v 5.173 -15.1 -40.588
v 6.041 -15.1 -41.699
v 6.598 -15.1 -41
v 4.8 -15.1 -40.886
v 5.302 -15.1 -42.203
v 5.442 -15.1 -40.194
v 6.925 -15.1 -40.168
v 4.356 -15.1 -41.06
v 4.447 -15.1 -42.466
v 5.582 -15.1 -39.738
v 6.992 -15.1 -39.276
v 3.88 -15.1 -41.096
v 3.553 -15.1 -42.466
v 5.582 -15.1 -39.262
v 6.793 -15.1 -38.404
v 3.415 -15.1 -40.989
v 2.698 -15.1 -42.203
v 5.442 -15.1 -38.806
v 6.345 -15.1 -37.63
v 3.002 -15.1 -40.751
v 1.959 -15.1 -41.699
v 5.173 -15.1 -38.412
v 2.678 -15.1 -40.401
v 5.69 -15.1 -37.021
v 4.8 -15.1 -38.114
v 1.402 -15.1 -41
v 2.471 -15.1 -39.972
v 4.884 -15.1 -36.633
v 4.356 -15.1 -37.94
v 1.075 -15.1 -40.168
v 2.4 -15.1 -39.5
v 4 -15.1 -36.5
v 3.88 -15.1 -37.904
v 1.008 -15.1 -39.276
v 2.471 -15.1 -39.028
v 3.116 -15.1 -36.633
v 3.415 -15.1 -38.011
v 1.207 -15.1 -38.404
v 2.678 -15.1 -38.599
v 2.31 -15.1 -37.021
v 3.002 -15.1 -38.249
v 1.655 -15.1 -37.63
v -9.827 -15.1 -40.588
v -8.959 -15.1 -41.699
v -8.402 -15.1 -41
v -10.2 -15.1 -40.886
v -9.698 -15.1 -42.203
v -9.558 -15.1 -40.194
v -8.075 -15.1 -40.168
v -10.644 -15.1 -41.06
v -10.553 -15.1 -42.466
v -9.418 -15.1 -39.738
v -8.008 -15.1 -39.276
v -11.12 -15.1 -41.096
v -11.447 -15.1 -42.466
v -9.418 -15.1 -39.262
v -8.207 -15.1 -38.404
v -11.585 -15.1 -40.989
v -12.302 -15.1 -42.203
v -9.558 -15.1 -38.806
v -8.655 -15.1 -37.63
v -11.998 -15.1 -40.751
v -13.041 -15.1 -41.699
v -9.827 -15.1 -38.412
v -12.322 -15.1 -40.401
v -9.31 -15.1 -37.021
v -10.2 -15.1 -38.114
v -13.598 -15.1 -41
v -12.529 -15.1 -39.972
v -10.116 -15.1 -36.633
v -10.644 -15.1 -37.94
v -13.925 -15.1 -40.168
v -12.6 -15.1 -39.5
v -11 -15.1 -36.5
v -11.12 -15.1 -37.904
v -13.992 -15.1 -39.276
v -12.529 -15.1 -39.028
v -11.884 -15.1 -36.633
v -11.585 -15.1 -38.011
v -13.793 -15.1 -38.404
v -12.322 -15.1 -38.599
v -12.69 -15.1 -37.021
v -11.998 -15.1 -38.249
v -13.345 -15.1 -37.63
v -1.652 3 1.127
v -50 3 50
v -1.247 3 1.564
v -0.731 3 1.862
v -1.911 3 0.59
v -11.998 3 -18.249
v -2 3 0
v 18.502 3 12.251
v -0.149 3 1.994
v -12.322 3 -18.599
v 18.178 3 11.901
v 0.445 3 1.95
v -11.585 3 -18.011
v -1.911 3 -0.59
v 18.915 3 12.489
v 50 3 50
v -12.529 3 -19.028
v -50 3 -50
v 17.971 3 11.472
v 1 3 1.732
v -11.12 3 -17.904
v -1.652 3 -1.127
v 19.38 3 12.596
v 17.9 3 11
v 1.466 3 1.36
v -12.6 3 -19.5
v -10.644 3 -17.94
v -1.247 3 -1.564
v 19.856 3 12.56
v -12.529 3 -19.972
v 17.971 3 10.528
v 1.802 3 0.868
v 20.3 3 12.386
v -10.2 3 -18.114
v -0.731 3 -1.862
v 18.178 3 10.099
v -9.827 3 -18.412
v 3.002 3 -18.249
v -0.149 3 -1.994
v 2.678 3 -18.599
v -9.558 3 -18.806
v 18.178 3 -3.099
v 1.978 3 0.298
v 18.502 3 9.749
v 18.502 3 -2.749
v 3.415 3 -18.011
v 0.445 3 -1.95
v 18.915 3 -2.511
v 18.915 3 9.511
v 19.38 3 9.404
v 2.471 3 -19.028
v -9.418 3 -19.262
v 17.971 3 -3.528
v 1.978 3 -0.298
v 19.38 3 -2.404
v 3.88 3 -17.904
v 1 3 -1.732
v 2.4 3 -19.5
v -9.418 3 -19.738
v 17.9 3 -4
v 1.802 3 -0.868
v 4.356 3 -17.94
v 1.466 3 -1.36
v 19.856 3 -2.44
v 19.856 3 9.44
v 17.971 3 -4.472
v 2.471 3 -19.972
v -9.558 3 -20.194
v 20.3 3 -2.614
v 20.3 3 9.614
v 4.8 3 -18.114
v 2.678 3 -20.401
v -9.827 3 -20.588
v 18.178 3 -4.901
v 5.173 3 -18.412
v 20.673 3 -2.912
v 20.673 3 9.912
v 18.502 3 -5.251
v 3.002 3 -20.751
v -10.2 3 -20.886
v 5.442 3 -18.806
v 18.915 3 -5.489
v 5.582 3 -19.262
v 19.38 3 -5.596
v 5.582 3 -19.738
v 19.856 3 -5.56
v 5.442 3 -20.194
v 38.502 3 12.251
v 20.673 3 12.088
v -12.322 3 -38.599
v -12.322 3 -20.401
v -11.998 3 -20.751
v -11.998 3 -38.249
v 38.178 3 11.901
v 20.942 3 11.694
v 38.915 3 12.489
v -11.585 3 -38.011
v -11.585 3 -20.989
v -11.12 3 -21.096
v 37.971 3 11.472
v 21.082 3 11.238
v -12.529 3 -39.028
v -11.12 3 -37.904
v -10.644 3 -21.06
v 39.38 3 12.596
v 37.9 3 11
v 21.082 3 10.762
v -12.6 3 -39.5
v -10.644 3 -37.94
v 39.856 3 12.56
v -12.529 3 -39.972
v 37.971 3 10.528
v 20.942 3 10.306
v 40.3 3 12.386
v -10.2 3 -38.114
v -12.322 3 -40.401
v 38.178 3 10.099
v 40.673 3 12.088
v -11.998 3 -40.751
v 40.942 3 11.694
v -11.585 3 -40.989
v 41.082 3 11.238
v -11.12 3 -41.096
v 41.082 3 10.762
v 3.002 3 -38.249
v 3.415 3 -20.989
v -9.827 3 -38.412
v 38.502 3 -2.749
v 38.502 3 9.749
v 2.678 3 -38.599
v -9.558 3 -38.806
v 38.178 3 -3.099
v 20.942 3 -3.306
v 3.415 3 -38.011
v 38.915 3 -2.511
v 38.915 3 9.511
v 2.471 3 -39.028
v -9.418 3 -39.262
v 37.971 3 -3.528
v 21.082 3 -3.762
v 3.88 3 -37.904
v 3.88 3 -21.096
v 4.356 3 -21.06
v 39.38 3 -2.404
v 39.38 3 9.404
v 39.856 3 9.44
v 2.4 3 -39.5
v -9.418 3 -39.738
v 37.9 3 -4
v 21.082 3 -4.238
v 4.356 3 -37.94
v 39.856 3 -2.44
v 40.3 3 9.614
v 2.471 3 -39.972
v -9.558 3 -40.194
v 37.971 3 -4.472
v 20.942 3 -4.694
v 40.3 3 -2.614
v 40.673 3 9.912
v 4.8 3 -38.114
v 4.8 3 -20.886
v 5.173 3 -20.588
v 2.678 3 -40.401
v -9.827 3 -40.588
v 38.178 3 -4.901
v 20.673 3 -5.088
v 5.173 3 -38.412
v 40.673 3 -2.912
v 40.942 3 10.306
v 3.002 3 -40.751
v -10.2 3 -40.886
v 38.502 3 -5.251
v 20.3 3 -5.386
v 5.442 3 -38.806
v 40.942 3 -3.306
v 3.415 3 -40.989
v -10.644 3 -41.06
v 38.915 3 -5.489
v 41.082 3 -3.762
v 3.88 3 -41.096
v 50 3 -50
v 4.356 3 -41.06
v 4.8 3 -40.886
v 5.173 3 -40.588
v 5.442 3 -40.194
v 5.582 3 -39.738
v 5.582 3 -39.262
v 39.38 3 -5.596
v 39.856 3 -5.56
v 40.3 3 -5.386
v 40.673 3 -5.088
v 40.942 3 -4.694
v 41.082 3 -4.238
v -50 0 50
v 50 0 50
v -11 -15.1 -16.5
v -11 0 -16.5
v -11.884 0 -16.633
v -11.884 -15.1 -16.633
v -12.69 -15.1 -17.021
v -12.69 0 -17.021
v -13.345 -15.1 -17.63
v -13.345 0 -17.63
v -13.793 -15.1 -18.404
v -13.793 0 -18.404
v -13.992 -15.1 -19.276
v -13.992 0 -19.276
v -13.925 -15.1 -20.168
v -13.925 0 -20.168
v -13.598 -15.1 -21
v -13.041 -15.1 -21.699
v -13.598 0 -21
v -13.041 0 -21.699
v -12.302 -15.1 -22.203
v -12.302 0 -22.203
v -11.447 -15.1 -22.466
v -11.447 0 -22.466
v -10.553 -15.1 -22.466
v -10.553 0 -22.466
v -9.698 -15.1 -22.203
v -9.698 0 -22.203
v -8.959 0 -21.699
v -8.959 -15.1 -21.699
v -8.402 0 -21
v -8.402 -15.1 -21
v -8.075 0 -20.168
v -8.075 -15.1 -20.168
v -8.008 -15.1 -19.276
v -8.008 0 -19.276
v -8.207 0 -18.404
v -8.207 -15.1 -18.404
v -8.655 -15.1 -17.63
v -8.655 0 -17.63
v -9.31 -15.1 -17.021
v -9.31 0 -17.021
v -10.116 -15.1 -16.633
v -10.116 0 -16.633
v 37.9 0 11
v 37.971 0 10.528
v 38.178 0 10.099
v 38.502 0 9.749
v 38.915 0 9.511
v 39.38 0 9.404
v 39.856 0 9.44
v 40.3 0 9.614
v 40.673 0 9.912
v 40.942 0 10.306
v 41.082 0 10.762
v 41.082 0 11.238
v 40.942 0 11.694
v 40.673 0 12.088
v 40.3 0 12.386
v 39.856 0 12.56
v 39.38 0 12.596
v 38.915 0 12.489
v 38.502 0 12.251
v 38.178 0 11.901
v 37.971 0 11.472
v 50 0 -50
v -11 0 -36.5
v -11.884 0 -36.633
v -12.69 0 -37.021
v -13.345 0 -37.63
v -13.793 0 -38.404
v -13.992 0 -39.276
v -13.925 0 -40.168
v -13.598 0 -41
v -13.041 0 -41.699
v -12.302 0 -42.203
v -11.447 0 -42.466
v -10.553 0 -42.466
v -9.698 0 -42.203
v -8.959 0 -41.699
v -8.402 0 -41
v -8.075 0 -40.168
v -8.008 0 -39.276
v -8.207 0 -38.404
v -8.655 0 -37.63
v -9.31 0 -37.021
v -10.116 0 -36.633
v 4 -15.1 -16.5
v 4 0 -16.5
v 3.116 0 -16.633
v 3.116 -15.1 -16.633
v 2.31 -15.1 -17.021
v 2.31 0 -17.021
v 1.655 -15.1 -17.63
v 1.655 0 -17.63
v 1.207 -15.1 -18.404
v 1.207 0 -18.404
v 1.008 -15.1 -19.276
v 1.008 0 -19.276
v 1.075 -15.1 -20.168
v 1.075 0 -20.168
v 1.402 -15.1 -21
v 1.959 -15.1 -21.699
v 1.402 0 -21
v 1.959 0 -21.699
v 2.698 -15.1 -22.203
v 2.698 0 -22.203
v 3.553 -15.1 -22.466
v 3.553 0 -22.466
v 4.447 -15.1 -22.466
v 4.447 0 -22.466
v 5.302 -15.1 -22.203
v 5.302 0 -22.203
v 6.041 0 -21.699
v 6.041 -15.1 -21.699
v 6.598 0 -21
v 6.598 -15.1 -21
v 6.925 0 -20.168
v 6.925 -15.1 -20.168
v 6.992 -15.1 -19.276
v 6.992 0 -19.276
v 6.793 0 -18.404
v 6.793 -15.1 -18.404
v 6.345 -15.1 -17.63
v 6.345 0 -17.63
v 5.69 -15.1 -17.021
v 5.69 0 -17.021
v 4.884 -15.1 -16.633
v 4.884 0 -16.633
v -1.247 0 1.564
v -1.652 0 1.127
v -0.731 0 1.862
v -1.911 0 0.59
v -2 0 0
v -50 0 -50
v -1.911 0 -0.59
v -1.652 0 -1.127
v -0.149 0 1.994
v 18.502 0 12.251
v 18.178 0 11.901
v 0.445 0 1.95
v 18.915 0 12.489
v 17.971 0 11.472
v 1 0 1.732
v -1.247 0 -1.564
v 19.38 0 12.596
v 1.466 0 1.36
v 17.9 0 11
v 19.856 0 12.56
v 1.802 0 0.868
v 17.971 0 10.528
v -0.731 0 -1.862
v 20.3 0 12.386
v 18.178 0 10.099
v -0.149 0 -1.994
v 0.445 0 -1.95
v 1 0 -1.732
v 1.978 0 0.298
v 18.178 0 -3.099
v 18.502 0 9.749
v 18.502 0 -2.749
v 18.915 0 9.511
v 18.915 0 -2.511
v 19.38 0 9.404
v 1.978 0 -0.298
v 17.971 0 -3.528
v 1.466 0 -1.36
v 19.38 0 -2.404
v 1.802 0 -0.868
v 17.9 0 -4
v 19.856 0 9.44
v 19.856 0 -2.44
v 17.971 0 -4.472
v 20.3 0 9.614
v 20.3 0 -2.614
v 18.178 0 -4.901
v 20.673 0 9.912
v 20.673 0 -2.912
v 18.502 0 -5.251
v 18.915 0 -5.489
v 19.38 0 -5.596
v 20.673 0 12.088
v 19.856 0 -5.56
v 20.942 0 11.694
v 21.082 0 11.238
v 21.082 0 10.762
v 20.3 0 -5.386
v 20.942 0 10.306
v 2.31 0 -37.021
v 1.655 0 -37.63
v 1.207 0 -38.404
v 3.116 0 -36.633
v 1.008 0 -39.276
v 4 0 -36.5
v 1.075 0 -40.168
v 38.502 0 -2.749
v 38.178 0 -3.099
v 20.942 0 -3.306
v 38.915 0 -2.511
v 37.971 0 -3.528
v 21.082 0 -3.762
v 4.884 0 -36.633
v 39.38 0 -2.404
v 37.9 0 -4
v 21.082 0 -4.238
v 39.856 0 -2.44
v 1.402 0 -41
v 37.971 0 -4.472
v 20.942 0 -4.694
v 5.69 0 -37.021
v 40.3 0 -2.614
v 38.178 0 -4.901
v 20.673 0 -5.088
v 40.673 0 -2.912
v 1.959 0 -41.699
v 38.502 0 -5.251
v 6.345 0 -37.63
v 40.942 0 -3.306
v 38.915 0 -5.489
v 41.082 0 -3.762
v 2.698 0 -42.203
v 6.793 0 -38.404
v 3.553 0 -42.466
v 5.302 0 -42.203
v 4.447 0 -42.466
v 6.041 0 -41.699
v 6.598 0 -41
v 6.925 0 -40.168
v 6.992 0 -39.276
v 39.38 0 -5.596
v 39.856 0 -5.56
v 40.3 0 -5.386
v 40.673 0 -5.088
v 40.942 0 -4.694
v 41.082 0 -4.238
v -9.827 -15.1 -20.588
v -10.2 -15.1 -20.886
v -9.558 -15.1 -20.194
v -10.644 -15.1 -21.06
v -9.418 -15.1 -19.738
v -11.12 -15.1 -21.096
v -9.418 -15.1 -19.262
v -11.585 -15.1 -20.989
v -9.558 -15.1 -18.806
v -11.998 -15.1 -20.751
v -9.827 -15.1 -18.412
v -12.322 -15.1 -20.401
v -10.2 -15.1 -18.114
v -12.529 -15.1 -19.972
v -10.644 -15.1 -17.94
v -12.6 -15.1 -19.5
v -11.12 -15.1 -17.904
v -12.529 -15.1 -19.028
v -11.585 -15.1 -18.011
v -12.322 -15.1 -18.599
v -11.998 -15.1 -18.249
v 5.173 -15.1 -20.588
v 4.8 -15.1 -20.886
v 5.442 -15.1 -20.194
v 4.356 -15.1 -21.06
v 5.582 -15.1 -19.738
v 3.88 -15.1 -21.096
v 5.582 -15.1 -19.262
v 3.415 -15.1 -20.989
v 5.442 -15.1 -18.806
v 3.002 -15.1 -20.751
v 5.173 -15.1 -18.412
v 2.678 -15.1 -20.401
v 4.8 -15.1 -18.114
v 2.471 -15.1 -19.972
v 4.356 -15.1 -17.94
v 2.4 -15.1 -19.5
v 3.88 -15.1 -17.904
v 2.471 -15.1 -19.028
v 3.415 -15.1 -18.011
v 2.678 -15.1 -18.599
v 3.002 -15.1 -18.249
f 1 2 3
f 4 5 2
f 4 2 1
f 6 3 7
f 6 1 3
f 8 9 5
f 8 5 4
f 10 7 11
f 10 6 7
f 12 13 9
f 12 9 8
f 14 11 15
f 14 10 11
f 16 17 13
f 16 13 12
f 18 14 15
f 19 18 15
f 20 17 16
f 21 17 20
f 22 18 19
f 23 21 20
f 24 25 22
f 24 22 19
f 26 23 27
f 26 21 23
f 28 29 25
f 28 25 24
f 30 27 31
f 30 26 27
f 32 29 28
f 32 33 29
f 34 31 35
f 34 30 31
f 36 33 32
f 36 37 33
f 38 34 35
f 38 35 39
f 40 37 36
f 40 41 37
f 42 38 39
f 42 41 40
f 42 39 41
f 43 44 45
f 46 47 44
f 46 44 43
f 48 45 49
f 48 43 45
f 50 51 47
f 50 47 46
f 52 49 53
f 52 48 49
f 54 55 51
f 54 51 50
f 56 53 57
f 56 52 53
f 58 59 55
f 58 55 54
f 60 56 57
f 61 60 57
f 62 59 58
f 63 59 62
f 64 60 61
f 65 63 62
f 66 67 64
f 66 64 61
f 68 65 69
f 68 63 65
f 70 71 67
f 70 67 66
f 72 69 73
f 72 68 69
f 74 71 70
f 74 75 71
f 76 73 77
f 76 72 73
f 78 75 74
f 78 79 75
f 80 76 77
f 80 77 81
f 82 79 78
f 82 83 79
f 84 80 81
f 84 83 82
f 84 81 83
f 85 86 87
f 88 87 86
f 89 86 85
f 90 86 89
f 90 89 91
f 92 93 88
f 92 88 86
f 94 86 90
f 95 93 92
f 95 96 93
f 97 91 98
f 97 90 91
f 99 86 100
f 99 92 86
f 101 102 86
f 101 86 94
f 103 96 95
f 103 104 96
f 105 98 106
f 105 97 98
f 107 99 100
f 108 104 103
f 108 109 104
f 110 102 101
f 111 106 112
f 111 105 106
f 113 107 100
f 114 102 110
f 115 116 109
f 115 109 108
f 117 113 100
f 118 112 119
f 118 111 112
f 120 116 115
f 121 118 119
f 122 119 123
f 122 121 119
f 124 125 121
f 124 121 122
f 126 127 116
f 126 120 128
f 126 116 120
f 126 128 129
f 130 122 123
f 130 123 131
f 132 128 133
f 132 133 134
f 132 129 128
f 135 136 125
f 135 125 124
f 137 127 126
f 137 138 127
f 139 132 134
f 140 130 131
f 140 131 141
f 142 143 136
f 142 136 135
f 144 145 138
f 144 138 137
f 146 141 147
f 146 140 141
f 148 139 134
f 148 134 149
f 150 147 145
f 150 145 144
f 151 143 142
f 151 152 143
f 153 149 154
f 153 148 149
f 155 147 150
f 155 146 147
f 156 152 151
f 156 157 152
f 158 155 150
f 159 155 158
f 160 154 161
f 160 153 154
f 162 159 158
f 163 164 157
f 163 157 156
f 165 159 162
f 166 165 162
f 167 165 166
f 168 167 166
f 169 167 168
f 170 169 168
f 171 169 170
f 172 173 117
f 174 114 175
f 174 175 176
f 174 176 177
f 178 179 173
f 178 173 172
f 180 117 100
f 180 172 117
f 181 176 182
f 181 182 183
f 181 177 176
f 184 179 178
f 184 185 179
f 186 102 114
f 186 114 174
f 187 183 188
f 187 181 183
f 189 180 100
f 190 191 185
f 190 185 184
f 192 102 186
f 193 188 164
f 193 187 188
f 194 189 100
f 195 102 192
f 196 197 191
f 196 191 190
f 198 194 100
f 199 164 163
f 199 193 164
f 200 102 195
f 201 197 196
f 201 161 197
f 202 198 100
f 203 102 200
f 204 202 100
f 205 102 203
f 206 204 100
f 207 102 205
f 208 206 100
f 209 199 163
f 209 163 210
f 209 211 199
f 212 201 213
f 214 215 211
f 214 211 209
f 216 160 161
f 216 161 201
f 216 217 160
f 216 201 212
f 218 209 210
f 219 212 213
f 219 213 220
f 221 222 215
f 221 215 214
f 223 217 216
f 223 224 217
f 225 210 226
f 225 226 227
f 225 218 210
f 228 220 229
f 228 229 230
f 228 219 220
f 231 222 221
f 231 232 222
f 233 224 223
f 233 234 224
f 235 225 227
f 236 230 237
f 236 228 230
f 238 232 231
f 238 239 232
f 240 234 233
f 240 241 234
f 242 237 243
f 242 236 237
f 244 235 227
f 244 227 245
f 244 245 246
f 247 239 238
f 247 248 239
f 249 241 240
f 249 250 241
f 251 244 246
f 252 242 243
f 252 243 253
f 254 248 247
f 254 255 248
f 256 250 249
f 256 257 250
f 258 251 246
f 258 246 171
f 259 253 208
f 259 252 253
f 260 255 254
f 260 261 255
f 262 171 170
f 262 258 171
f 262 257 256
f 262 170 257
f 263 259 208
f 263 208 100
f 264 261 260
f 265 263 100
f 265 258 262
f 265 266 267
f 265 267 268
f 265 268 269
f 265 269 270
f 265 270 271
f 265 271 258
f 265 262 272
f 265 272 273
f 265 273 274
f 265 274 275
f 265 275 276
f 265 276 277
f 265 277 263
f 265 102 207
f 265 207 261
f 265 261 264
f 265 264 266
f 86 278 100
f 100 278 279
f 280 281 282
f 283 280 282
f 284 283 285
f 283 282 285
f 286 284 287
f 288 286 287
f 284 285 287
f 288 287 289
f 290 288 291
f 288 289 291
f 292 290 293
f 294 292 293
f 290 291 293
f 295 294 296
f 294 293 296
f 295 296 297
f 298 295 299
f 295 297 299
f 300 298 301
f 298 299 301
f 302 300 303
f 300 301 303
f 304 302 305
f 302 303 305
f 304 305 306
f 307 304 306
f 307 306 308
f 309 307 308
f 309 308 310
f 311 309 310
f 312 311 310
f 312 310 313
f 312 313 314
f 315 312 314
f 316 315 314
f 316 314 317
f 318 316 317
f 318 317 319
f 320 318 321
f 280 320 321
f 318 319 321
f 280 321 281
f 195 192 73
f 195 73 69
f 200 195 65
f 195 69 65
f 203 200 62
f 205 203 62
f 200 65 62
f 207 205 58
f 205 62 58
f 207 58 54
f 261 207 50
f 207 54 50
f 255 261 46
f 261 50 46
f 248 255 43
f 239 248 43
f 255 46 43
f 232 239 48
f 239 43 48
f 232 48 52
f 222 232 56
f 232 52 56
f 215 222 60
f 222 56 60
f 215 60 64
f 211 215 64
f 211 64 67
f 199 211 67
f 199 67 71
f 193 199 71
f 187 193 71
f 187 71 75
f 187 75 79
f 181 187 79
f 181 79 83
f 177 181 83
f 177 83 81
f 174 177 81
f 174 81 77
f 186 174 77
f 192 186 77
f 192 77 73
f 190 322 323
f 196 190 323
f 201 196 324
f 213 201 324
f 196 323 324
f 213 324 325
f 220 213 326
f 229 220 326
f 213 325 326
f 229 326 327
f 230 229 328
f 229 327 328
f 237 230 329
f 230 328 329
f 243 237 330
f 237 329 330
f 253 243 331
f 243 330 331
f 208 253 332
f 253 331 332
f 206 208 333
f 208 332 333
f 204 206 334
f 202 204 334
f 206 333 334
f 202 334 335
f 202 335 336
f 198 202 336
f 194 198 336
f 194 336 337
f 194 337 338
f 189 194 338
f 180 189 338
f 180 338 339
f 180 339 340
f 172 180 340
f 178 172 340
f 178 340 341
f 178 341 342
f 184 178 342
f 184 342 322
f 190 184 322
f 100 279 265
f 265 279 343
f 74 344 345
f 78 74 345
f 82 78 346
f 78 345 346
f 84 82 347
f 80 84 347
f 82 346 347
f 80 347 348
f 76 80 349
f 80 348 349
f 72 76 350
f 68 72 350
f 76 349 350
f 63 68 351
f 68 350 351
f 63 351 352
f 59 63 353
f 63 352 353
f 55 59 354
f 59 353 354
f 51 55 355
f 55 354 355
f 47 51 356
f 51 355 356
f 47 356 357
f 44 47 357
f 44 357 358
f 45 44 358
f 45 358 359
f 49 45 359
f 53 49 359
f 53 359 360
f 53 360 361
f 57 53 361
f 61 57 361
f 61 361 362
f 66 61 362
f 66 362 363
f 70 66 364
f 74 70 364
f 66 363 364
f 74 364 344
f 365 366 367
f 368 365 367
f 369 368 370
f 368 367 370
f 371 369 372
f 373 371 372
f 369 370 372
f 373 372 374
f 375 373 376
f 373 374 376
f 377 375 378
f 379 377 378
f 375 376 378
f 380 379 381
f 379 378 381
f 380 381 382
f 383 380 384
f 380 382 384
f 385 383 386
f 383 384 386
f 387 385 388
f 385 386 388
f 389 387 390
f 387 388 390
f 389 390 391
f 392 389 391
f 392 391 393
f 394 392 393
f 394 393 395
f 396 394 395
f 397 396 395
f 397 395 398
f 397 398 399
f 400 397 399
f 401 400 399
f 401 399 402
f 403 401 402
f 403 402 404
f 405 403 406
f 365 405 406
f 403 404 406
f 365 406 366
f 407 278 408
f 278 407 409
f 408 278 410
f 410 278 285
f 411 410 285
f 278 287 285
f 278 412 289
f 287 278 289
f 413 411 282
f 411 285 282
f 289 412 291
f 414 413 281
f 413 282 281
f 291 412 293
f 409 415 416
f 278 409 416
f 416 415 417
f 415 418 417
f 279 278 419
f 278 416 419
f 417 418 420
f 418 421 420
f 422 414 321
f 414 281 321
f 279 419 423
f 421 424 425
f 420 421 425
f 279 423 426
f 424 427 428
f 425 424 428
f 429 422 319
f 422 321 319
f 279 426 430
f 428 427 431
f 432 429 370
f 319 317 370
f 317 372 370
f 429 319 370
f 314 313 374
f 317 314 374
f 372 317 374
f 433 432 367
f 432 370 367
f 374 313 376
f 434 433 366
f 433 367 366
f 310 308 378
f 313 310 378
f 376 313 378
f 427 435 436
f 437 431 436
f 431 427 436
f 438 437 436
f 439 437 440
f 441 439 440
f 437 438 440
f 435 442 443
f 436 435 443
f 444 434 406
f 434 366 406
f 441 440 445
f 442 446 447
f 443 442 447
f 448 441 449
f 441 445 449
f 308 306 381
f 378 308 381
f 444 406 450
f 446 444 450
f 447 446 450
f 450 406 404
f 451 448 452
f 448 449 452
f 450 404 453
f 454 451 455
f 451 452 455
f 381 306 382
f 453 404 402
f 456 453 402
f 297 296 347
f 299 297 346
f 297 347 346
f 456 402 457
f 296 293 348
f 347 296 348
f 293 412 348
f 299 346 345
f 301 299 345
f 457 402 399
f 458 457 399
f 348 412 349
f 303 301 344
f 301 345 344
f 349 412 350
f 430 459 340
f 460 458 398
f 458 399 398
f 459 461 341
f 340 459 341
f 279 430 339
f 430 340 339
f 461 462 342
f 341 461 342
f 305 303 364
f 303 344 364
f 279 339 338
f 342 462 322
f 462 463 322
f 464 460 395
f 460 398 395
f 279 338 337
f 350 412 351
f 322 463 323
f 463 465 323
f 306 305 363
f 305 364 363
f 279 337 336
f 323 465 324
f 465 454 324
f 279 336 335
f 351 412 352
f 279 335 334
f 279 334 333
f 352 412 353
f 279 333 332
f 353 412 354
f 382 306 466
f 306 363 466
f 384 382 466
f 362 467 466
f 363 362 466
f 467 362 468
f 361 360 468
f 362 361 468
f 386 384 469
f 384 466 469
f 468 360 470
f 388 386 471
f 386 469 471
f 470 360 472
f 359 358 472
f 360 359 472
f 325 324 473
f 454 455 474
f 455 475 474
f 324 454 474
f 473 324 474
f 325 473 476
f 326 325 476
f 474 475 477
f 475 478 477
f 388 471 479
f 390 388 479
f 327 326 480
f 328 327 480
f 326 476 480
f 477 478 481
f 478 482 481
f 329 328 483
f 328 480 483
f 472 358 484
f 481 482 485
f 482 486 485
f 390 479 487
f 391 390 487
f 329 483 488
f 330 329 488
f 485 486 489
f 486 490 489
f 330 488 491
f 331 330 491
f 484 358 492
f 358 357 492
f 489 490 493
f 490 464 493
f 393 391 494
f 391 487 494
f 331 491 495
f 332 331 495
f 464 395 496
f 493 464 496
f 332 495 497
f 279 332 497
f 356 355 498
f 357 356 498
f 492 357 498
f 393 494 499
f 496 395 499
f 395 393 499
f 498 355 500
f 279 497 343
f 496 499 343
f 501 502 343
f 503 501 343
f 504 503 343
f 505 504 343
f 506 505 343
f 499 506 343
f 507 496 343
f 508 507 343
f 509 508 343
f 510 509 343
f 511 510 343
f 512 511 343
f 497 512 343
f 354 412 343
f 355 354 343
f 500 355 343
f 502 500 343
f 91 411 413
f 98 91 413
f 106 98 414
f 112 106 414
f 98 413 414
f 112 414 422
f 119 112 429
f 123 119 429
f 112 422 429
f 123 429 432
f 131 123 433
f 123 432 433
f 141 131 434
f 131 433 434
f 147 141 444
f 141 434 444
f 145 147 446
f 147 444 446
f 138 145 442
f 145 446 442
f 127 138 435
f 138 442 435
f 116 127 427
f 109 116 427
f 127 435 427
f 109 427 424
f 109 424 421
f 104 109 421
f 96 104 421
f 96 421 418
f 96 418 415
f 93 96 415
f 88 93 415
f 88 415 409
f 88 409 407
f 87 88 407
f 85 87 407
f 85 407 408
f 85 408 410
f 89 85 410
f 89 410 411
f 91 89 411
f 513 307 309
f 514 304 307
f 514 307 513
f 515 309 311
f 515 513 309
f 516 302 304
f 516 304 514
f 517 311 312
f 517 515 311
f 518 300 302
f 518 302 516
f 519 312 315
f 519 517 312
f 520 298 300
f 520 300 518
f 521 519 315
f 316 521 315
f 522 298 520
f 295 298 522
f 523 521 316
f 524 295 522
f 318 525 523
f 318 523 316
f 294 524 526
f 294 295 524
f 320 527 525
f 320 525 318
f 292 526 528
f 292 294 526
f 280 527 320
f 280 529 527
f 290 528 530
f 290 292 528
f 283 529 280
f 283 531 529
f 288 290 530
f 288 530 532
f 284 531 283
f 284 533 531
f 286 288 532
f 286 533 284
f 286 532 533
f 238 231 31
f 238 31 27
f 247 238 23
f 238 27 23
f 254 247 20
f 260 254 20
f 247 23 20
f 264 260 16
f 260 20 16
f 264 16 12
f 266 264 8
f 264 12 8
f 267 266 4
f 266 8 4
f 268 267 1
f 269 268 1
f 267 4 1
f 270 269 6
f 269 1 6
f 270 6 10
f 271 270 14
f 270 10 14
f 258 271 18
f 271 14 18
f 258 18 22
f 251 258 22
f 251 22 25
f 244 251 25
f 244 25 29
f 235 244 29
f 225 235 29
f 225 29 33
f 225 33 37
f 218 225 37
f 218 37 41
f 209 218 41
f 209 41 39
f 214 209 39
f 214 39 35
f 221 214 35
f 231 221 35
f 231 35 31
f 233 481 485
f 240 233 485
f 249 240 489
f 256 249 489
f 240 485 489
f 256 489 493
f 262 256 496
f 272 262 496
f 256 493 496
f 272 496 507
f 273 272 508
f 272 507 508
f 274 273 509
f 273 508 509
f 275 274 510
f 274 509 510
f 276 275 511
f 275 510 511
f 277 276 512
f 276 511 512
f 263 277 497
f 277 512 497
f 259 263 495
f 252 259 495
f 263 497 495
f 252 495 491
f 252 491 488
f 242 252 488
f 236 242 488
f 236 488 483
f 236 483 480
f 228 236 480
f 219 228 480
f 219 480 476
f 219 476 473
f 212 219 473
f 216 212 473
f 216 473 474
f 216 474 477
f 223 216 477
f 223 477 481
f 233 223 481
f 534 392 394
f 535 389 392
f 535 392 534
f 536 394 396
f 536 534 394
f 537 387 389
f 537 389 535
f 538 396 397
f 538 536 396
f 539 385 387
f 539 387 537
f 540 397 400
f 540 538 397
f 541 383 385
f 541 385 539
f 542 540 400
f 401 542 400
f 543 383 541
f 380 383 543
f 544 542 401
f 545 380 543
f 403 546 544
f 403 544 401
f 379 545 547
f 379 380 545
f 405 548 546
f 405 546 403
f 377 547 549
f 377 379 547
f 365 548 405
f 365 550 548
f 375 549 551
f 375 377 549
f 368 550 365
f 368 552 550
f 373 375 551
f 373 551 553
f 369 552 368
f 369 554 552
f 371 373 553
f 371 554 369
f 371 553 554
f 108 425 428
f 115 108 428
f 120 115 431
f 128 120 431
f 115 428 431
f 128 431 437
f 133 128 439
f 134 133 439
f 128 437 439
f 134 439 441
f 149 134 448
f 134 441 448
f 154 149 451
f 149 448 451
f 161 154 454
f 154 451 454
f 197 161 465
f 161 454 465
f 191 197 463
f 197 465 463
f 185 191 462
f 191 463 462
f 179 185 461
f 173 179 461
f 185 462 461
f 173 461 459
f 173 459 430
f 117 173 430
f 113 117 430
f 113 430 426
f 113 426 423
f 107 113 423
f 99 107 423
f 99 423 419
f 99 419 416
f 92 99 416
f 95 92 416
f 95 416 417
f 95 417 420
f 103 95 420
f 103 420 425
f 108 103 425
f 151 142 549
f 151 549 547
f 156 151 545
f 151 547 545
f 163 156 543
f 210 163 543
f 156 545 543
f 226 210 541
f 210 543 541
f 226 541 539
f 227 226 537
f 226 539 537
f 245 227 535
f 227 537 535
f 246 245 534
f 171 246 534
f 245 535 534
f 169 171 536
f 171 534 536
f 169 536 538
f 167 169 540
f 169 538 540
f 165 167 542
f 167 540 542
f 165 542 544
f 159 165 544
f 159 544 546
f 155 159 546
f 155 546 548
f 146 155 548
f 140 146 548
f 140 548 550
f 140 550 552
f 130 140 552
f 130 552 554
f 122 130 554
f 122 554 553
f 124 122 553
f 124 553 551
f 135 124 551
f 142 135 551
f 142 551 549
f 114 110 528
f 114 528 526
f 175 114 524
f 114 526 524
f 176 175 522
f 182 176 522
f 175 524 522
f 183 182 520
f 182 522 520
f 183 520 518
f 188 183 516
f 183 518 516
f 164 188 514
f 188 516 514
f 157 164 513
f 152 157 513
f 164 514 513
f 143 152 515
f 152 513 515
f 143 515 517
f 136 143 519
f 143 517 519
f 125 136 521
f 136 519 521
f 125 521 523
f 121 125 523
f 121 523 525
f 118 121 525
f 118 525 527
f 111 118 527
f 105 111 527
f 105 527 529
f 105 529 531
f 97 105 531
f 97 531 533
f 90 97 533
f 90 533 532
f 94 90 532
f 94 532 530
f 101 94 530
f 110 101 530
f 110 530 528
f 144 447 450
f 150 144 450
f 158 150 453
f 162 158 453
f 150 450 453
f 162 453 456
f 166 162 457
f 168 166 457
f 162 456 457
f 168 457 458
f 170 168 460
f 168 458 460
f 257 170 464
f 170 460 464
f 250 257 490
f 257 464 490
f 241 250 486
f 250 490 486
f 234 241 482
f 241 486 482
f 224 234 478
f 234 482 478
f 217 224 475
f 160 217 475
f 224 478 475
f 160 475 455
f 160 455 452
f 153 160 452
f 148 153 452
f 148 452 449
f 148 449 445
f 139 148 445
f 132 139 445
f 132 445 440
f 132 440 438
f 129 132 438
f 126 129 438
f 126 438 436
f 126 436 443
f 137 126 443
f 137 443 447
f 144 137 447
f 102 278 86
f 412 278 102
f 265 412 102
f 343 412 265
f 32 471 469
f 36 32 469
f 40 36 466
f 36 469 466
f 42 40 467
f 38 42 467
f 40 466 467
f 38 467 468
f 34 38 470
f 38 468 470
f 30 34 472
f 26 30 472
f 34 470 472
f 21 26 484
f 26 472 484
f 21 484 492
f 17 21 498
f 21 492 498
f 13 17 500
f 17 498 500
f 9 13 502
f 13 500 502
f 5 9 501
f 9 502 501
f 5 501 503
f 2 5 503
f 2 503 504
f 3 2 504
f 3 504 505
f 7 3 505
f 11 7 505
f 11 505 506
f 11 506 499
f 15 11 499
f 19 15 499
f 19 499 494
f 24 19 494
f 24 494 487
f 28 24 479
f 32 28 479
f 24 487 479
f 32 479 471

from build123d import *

# Parameters (mm, degrees)
SKETCH2_W                = 100
SKETCH2_H                = 100
BOSS_EXTRUDE1_DEPTH      = 3
SKETCH8_R                = 3
BOSS_EXTRUDE2_DEPTH      = 15.1
M3_CLEARANCE_HOLE1_D     = 3.2
F_4_0_4_DIAMETER_HOLE1_D = 4


with BuildPart() as part:
    # Sketch2 → Boss-Extrude1 (new body)
    with BuildSketch(Plane(origin=(0, 0, 0), x_dir=(1, 0, 0), z_dir=(0, 1, 0))):
        Rectangle(SKETCH2_W, SKETCH2_H)
    extrude(amount=BOSS_EXTRUDE1_DEPTH)

    # Sketch8 → Boss-Extrude2 (add)
    with BuildSketch(Plane.XZ):
        with Locations(Location((-11, -19.5, 0), (0, 0, 90))):
            Circle(SKETCH8_R)
        with Locations(Location((4, -19.5, 0), (0, 0, 90))):
            Circle(SKETCH8_R)
        with Locations(Location((4, -39.5, 0), (0, 0, 90))):
            Circle(SKETCH8_R)
        with Locations(Location((-11, -39.5, 0), (0, 0, 90))):
            Circle(SKETCH8_R)
    extrude(amount=BOSS_EXTRUDE2_DEPTH)

    # M3 Clearance Hole1 (through all)
    with Locations(Plane(origin=(0, 3, 0), x_dir=(1, 0, 0), z_dir=(0, 1, 0))):
        with Locations((-11, 39.5), (4, 39.5), (4, 19.5), (-11, 19.5), (19.5, 4), (39.5, 4), (39.5, -11), (19.5, -11)):
            Hole(M3_CLEARANCE_HOLE1_D / 2)

    # Ø4.0 (4) Diameter Hole1 (through all)
    with Locations(Plane(origin=(0, 3, 0), x_dir=(1, 0, 0), z_dir=(0, 1, 0))):
        with Locations((0, 0)):
            Hole(F_4_0_4_DIAMETER_HOLE1_D / 2)


solid = part.part
